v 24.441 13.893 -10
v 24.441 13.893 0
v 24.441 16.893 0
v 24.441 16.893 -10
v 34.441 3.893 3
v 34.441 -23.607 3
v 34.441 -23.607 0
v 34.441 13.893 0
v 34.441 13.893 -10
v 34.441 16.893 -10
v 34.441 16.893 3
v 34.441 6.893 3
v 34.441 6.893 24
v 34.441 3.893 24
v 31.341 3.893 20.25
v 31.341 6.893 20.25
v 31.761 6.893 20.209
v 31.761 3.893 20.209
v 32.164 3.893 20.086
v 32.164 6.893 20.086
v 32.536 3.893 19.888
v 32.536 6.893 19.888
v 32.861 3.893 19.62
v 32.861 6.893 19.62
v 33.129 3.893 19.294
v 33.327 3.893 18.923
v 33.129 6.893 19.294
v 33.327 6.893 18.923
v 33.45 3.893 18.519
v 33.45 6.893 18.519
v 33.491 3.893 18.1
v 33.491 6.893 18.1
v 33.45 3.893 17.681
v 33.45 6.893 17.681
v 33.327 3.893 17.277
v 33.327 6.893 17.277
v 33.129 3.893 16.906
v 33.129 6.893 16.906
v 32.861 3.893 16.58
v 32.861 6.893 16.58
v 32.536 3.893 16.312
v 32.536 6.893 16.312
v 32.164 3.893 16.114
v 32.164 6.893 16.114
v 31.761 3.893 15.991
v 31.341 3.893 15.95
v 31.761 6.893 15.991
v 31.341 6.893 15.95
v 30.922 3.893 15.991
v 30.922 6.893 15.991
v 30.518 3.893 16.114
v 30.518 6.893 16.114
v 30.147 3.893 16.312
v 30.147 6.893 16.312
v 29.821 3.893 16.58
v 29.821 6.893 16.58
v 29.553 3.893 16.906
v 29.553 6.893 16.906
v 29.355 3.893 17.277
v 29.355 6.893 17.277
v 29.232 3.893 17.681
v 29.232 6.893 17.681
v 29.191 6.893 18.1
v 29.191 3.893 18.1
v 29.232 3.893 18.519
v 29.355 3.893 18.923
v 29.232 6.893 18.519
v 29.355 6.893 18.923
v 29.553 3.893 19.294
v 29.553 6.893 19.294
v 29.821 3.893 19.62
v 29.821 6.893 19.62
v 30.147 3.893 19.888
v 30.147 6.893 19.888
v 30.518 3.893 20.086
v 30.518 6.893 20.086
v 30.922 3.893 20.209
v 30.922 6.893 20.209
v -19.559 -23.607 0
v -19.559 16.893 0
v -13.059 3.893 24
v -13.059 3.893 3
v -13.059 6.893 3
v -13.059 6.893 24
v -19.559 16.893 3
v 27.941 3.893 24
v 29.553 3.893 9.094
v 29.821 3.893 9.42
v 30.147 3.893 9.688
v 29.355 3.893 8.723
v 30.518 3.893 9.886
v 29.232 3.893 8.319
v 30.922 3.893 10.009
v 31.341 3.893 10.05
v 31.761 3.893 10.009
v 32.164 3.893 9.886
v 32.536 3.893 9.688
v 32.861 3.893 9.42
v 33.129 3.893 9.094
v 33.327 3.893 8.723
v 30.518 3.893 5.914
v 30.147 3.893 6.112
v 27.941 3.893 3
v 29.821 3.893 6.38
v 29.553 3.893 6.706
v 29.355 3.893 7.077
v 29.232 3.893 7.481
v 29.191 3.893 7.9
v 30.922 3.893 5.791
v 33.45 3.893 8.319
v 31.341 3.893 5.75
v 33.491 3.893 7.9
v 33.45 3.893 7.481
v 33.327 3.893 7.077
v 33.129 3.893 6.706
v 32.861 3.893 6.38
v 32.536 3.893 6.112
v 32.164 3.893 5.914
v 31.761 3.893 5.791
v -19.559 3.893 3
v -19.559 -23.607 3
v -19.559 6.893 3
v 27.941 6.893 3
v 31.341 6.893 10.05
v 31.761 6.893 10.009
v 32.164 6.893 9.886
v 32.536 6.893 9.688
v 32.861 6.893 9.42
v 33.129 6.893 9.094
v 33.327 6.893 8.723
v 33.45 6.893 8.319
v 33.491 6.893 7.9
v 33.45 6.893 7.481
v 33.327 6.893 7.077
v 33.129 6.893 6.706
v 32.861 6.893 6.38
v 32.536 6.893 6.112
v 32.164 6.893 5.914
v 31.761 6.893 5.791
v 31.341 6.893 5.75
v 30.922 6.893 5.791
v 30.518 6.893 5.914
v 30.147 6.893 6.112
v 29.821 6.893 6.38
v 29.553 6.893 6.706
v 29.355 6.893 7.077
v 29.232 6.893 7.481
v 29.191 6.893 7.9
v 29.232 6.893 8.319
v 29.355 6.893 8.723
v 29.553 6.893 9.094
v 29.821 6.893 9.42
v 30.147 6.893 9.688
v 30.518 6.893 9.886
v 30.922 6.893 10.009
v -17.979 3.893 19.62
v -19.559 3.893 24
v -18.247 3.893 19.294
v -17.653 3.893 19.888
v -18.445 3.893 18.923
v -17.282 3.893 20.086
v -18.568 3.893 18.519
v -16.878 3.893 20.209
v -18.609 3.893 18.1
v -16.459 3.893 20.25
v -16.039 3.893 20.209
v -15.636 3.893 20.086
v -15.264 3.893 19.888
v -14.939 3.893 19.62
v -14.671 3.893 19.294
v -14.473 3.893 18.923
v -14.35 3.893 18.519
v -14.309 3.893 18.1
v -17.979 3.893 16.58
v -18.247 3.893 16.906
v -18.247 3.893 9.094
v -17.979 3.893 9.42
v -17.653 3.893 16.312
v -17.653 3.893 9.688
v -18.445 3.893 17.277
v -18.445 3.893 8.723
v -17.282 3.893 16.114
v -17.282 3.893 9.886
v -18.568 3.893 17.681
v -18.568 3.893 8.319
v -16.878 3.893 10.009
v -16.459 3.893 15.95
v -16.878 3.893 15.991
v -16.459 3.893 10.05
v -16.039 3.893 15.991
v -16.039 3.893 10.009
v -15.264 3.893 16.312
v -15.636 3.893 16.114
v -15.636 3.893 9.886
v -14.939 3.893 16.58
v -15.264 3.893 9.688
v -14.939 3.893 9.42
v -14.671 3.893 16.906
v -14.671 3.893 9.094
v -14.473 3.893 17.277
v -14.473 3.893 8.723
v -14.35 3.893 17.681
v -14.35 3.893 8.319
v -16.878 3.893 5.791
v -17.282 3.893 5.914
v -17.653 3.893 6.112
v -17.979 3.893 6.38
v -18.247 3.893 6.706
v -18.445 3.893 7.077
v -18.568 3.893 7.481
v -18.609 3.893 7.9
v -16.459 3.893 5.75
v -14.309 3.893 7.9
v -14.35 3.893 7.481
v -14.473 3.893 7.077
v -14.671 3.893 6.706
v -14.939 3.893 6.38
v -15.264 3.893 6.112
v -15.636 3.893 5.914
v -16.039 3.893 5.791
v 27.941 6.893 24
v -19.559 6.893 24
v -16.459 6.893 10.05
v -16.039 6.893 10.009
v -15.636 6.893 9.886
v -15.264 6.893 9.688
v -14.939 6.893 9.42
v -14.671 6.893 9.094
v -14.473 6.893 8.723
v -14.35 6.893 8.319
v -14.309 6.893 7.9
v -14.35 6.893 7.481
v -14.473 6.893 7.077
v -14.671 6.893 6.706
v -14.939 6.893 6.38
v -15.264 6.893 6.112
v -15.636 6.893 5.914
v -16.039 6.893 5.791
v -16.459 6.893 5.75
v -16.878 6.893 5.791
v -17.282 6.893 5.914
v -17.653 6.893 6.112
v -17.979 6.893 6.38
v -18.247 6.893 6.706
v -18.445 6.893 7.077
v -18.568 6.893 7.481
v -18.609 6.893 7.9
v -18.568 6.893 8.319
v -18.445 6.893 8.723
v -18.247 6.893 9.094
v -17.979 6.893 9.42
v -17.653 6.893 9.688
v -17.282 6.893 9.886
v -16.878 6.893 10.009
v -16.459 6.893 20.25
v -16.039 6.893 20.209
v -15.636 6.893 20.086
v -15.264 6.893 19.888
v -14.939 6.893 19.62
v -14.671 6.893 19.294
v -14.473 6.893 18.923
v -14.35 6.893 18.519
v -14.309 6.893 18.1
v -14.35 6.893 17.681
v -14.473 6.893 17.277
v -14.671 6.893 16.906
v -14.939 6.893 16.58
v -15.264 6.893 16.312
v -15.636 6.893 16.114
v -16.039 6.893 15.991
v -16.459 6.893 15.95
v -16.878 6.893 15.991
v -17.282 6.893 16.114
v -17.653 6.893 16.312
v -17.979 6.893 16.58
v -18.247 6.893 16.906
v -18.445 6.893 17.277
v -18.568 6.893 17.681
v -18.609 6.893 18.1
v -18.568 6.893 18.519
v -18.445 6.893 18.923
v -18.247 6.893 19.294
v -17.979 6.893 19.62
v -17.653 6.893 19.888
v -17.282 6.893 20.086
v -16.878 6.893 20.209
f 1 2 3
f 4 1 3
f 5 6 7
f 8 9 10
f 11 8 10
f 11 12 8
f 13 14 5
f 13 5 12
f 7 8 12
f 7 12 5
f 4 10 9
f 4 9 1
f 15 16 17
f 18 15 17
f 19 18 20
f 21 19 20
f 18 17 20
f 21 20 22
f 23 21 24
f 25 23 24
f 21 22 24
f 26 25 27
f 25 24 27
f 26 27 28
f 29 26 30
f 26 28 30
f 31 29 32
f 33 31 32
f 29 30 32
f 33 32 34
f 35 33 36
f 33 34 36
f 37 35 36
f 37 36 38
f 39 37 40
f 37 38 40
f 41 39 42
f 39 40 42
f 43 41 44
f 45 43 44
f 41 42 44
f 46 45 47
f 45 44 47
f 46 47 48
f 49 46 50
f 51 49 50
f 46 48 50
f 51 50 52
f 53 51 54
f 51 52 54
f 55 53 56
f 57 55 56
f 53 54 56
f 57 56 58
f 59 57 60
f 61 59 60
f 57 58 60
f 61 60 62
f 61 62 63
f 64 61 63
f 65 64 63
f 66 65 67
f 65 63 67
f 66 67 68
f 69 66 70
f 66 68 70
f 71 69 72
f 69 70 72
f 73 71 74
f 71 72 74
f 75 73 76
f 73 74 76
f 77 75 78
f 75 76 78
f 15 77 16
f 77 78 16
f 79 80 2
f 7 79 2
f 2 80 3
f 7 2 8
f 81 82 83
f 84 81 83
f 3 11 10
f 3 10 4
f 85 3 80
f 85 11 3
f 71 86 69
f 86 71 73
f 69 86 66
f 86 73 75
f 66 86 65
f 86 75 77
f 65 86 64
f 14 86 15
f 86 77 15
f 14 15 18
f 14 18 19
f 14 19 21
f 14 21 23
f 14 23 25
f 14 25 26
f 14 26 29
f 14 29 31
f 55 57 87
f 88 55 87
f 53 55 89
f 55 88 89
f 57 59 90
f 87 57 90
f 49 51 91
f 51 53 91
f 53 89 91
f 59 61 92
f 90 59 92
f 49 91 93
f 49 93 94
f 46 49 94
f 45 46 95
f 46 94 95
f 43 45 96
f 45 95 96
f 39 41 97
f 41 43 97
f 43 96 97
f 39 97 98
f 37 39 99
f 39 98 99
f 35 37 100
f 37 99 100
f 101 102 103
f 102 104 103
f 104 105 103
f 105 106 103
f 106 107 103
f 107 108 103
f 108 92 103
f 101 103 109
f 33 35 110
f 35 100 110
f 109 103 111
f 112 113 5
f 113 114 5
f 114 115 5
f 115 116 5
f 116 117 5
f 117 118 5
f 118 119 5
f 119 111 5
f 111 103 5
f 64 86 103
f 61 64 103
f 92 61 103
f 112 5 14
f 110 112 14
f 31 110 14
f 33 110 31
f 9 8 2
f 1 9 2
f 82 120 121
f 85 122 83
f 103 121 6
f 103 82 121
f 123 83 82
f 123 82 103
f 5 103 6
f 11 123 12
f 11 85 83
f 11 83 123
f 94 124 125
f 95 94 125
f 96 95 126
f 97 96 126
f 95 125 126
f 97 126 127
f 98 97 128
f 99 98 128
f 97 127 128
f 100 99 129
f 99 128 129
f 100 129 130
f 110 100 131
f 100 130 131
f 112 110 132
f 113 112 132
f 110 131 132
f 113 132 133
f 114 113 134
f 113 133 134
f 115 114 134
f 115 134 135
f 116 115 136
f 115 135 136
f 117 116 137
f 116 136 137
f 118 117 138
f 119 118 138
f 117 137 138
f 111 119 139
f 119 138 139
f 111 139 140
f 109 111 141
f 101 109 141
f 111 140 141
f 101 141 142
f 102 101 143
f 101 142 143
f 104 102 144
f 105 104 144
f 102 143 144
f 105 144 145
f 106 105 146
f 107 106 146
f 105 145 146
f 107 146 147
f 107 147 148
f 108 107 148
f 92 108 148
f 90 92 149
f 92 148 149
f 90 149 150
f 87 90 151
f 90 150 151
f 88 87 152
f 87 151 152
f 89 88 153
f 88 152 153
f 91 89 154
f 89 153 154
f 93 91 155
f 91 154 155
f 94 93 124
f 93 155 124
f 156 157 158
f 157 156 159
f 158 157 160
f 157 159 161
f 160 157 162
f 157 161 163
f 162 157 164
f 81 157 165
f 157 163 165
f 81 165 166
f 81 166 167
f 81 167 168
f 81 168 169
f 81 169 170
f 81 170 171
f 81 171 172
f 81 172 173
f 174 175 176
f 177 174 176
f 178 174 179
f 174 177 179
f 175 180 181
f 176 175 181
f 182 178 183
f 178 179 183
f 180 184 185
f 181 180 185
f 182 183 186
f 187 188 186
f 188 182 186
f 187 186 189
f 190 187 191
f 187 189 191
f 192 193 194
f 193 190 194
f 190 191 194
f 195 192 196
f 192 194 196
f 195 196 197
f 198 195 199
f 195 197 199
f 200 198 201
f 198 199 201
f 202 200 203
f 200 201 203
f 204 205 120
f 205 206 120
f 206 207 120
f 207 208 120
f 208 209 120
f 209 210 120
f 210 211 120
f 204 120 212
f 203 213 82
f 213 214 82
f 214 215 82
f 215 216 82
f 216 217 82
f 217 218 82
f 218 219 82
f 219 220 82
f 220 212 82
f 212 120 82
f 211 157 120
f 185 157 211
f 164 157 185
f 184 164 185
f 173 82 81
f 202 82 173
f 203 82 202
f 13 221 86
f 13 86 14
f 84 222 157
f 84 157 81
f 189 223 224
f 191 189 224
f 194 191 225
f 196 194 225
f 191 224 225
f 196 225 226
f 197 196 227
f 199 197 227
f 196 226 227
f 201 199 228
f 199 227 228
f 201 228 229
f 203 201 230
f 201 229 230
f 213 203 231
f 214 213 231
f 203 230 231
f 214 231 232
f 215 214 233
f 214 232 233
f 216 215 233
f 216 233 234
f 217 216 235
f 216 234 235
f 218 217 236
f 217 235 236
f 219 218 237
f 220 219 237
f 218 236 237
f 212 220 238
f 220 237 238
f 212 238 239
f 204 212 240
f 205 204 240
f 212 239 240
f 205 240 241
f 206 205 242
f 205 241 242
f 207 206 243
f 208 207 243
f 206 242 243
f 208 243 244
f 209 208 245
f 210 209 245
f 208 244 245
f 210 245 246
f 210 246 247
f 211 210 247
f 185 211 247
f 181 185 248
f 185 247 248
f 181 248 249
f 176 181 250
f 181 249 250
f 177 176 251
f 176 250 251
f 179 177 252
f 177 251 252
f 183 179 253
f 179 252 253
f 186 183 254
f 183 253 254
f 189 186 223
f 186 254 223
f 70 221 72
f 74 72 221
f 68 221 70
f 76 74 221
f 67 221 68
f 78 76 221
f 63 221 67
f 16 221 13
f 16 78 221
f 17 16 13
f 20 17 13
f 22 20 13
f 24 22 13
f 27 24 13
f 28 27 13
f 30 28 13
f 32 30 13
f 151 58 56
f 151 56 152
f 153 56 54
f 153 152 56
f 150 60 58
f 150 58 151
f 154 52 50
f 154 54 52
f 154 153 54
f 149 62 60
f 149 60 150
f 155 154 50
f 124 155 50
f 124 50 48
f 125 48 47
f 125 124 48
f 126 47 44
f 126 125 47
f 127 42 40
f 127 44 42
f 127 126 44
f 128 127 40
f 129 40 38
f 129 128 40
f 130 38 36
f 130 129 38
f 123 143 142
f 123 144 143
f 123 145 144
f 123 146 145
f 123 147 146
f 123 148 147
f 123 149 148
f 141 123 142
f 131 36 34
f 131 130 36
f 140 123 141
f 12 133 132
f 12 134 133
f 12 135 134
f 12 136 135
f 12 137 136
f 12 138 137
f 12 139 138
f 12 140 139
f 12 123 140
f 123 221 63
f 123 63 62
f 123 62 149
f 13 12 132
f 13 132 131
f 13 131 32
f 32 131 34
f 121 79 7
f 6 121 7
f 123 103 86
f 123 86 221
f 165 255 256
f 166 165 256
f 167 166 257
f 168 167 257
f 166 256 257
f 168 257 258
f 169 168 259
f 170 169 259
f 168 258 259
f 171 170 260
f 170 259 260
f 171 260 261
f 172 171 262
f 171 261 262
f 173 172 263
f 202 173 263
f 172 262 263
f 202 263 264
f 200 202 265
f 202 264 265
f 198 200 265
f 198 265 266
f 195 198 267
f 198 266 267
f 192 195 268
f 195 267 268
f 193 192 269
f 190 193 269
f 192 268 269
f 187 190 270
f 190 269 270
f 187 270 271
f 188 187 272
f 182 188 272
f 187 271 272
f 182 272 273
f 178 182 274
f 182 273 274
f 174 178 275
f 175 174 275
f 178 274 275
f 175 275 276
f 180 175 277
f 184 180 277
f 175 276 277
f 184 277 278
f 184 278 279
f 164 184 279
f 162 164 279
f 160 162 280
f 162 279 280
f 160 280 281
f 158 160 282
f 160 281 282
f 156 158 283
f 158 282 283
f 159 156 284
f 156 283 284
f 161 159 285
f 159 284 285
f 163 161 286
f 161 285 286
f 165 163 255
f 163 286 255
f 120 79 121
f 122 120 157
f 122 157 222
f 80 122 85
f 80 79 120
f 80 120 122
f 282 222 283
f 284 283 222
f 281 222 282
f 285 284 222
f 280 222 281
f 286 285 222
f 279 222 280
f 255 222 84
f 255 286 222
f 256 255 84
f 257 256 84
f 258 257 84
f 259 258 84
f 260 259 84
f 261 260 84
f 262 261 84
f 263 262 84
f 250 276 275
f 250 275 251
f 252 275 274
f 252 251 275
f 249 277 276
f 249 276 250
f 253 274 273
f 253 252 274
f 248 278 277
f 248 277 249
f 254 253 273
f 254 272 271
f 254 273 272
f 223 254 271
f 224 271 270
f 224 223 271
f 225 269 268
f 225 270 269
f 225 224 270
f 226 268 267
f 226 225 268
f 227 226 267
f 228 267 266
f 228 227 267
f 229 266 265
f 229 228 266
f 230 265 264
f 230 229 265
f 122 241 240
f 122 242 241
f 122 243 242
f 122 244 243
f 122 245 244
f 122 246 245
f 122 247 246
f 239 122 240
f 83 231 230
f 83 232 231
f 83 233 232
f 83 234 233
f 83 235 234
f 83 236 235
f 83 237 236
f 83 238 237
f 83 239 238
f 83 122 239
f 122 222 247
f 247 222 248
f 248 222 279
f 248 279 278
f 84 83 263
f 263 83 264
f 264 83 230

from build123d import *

# Parameters (mm, degrees)
SKETCH1_W           = 54
SKETCH1_H           = 40.5
BOSS_EXTRUDE1_DEPTH = 3
SKETCH3_W           = 6.5
SKETCH3_H           = 3
BOSS_EXTRUDE2_DEPTH = 21
SKETCH4_W           = 10
SKETCH4_H           = 3
BOSS_EXTRUDE3_DEPTH = 10
SKETCH5_R           = 2.15
CUT_EXTRUDE1_DEPTH  = 3


with BuildPart() as part:
    # Sketch1 → Boss-Extrude1 (new body)
    with BuildSketch(Plane.XY):
        with Locations((7.441119081, -3.357474474)):
            Rectangle(SKETCH1_W, SKETCH1_H)
    extrude(amount=BOSS_EXTRUDE1_DEPTH)

    # Sketch3 → Boss-Extrude2 (add)
    with BuildSketch(Plane.XY.offset(3)):
        with Locations((31.191119081, 5.392525526)):
            Rectangle(SKETCH3_W, SKETCH3_H)
        with Locations((-16.308880919, 5.392525526)):
            Rectangle(SKETCH3_W, SKETCH3_H)
    extrude(amount=BOSS_EXTRUDE2_DEPTH)

    # Sketch4 → Boss-Extrude3 (add)
    with BuildSketch(Plane(origin=(0, 0, 0), x_dir=(-1, 0, 0), z_dir=(0, 0, -1))):
        with Locations((-29.441119081, 15.392525526)):
            Rectangle(SKETCH4_W, SKETCH4_H)
    extrude(amount=BOSS_EXTRUDE3_DEPTH)

    # Sketch5 → Cut-Extrude1 (cut)
    with BuildSketch(Plane(origin=(0, 6.892525526, 0), x_dir=(1, 0, 0), z_dir=(0, 1, 0))):
        with Locations(Location((31.341119081, -18.1, 0), (0, 0, 270))):
            Circle(SKETCH5_R)
        with Locations(Location((31.341119081, -7.9, 0), (0, 0, 270))):
            Circle(SKETCH5_R)
        with Locations(Location((-16.458880919, -18.1, 0), (0, 0, 270))):
            Circle(SKETCH5_R)
        with Locations(Location((-16.458880919, -7.9, 0), (0, 0, 270))):
            Circle(SKETCH5_R)
    extrude(amount=-CUT_EXTRUDE1_DEPTH, mode=Mode.SUBTRACT)


solid = part.part
